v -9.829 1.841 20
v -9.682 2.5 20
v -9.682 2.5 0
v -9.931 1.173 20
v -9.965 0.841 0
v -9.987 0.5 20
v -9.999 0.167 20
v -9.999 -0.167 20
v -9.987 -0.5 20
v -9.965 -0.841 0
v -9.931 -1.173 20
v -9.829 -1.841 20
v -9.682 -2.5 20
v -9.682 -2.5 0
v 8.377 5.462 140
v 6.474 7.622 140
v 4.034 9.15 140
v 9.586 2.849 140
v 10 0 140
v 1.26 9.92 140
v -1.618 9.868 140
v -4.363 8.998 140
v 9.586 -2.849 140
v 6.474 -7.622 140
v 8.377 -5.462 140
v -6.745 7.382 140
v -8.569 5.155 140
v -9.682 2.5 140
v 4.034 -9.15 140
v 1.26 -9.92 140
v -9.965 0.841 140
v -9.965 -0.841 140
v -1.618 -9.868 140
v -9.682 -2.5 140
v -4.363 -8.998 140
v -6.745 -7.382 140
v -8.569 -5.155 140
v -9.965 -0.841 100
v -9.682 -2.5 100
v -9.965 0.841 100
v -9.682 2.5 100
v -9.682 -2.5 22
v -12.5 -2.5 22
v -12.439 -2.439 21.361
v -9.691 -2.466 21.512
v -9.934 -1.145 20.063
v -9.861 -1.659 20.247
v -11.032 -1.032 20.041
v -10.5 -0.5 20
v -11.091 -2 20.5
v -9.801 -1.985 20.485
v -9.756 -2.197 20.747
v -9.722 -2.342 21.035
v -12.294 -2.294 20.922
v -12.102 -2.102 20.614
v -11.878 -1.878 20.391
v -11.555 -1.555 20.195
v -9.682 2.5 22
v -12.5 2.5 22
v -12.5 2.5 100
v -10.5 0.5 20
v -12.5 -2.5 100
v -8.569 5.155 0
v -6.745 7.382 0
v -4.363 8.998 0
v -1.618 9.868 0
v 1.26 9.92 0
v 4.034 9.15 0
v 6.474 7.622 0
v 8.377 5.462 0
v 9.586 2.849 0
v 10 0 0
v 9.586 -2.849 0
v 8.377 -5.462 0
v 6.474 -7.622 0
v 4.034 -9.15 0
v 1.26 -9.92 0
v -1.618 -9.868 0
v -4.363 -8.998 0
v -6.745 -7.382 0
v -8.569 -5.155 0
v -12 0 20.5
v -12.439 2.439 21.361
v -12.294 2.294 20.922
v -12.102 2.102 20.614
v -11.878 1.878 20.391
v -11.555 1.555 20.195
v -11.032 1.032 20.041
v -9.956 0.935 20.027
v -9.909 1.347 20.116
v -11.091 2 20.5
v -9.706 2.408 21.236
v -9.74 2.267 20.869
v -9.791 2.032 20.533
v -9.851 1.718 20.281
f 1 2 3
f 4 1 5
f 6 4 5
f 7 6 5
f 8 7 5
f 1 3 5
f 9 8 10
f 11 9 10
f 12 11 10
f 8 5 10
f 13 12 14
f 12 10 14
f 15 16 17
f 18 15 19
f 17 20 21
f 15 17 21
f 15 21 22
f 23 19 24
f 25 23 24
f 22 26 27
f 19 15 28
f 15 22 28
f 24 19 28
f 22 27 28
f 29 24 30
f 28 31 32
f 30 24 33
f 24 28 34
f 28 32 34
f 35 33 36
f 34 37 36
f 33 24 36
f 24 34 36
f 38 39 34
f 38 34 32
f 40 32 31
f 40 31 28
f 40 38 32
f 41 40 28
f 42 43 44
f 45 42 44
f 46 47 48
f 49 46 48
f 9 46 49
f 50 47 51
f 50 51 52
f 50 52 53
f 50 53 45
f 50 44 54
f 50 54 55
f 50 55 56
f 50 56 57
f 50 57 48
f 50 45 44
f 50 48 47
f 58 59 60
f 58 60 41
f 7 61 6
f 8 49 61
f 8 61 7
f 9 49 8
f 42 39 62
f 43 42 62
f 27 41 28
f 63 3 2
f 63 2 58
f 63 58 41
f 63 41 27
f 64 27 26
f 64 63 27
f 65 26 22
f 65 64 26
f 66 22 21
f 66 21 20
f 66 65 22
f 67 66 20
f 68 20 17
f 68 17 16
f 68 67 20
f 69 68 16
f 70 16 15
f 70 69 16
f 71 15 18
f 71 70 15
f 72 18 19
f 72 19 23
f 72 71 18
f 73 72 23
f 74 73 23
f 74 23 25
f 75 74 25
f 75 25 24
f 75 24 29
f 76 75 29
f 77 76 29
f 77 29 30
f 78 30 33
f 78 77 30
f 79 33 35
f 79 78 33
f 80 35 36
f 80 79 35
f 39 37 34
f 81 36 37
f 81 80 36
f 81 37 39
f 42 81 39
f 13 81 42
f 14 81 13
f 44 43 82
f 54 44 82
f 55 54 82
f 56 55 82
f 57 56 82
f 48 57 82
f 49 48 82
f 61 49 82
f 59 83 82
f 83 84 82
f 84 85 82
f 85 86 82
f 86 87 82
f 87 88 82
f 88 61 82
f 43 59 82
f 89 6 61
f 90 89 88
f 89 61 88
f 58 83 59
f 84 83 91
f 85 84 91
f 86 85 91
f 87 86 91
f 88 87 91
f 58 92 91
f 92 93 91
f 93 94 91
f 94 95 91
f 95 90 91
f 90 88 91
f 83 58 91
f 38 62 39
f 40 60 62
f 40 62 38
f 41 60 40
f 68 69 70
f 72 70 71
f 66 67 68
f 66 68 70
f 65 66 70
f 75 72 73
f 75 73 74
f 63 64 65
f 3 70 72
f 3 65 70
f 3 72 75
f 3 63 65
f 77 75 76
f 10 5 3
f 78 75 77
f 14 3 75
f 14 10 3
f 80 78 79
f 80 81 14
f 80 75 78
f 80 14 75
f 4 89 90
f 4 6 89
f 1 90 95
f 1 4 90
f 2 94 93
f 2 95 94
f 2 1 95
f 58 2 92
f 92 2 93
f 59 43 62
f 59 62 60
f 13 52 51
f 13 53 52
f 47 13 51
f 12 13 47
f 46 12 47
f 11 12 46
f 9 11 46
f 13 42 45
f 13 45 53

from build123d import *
from build123d.topology import SkipClean

# Parameters (mm, degrees)
BOSS_EXTRUDE1_DEPTH = 140
CUT_EXTRUDE1_DEPTH  = 20
CUT_EXTRUDE2_START  = -40
CUT_EXTRUDE2_DEPTH  = 40
CUT_EXTRUDE4_DEPTH  = 0.0001
FILLET2_SIZE        = 2


with BuildPart() as part:
    # Sketch1 → Boss-Extrude1 (new body)
    with BuildSketch(Plane(origin=(0, 0, 0), x_dir=(0, 1, 0), z_dir=(0, 0, 1))):
        with BuildLine():
            Line((-2.5, 12.5), (2.5, 12.5))
            Line((2.5, 12.5), (2.5, 9.682458))
            ThreePointArc((2.5, 9.682458), (0, -10), (-2.5, 9.682458))
            Line((-2.5, 9.682458), (-2.5, 12.5))
        make_face()
    extrude(amount=BOSS_EXTRUDE1_DEPTH)

    # Sketch2 → Cut-Extrude1 (cut)
    with SkipClean():  # the faces are left unmerged after this step: merging them gives an invalid solid
        with BuildSketch(Plane(origin=(0, 0, 0), x_dir=(1, 0, 0), z_dir=(0, 0, -1))):
            with BuildLine():
                Line((-9.682458, 2.5), (-12.5, 2.5))
                Line((-12.5, 2.5), (-12.5, -2.5))
                Line((-12.5, -2.5), (-9.682458, -2.5))
                ThreePointArc((-9.682458, -2.5), (-10, 0), (-9.682458, 2.5))
            make_face()
        extrude(amount=-CUT_EXTRUDE1_DEPTH, mode=Mode.SUBTRACT)

    # Sketch3 → Cut-Extrude2 (cut)
    with SkipClean():  # the faces are left unmerged after this step: merging them gives an invalid solid
        with BuildSketch(Plane.XY.offset(140).offset(CUT_EXTRUDE2_START)):
            with BuildLine():
                Line((-9.682458, 2.5), (-12.5, 2.5))
                Line((-12.5, 2.5), (-12.5, -2.5))
                Line((-12.5, -2.5), (-9.682458, -2.5))
                ThreePointArc((-9.682458, -2.5), (-10, 0), (-9.682458, 2.5))
            make_face()
        extrude(amount=CUT_EXTRUDE2_DEPTH, mode=Mode.SUBTRACT)

    # Sketch4 → Cut-Extrude4 (cut)
    with SkipClean():  # the faces are left unmerged after this step: merging them gives an invalid solid
        with BuildSketch(Plane(origin=(0, 0, 20), x_dir=(1, 0, 0), z_dir=(0, 0, -1))):
            with BuildLine():
                Line((-9.682458, 2.5), (-12.5, 2.5))
                Line((-12.5, 2.5), (-12.5, -2.5))
                Line((-12.5, -2.5), (-9.682458, -2.5))
                ThreePointArc((-9.682458, -2.5), (-10, 0), (-9.682458, 2.5))
            make_face()
        extrude(amount=-CUT_EXTRUDE4_DEPTH, mode=Mode.SUBTRACT)

    # Fillet2
    # a fillet whose section is not a circle: 2 mm, written as the material it takes off along each edge
    with BuildSketch(Plane(origin=(-4.682458, -2.5, 20.0001), x_dir=(0, 0, 1), z_dir=(-1, 0, 0))) as fillet2_piece_1_section:
        with BuildLine():
            Bezier((FILLET2_SIZE, 0), (0, 0), (0, FILLET2_SIZE), weights=[1, 1, 1])
            Line((0, FILLET2_SIZE), (0, 0))
            Line((0, 0), (FILLET2_SIZE, 0))
        make_face()
    fillet2_piece_1 = extrude(amount=12.817542, mode=Mode.PRIVATE)
    fillet2_piece_1 = fillet2_piece_1 - Plane(origin=(0, 0, 20.0001), x_dir=(-0.9682458365518543, 0.2500000000000001, 0), z_dir=(0, 0, -1)) * Cylinder(10, 34, mode=Mode.PRIVATE)
    add(fillet2_piece_1, mode=Mode.SUBTRACT)
    with BuildSketch(Plane(origin=(-17.5, 2.5, 20.0001), x_dir=(0, -1, 0), z_dir=(1, 0, 0))) as fillet2_piece_2_section:
        with BuildLine():
            Bezier((FILLET2_SIZE, 0), (0, 0), (0, -FILLET2_SIZE), weights=[1, 1, 1])
            Line((0, -FILLET2_SIZE), (0, 0))
            Line((0, 0), (FILLET2_SIZE, 0))
        make_face()
    fillet2_piece_2 = extrude(amount=12.817542, mode=Mode.PRIVATE)
    fillet2_piece_2 = fillet2_piece_2 - Plane(origin=(0, 0, 20.0001), x_dir=(-0.9682458365518561, 0.24999999999999276, 0), z_dir=(0, 0, -1)) * Cylinder(10, 34, mode=Mode.PRIVATE)
    add(fillet2_piece_2, mode=Mode.SUBTRACT)
    with BuildSketch(Plane(origin=(-12.5, -7.5, 20.0001), x_dir=(1, 0, 0), z_dir=(0, 1, 0))) as fillet2_piece_3:
        with BuildLine():
            Bezier((FILLET2_SIZE, 0), (0, 0), (0, -FILLET2_SIZE), weights=[1, 1, 1])
            Line((0, -FILLET2_SIZE), (0, 0))
            Line((0, 0), (FILLET2_SIZE, 0))
        make_face()
    extrude(amount=15, mode=Mode.SUBTRACT)


solid = part.part
